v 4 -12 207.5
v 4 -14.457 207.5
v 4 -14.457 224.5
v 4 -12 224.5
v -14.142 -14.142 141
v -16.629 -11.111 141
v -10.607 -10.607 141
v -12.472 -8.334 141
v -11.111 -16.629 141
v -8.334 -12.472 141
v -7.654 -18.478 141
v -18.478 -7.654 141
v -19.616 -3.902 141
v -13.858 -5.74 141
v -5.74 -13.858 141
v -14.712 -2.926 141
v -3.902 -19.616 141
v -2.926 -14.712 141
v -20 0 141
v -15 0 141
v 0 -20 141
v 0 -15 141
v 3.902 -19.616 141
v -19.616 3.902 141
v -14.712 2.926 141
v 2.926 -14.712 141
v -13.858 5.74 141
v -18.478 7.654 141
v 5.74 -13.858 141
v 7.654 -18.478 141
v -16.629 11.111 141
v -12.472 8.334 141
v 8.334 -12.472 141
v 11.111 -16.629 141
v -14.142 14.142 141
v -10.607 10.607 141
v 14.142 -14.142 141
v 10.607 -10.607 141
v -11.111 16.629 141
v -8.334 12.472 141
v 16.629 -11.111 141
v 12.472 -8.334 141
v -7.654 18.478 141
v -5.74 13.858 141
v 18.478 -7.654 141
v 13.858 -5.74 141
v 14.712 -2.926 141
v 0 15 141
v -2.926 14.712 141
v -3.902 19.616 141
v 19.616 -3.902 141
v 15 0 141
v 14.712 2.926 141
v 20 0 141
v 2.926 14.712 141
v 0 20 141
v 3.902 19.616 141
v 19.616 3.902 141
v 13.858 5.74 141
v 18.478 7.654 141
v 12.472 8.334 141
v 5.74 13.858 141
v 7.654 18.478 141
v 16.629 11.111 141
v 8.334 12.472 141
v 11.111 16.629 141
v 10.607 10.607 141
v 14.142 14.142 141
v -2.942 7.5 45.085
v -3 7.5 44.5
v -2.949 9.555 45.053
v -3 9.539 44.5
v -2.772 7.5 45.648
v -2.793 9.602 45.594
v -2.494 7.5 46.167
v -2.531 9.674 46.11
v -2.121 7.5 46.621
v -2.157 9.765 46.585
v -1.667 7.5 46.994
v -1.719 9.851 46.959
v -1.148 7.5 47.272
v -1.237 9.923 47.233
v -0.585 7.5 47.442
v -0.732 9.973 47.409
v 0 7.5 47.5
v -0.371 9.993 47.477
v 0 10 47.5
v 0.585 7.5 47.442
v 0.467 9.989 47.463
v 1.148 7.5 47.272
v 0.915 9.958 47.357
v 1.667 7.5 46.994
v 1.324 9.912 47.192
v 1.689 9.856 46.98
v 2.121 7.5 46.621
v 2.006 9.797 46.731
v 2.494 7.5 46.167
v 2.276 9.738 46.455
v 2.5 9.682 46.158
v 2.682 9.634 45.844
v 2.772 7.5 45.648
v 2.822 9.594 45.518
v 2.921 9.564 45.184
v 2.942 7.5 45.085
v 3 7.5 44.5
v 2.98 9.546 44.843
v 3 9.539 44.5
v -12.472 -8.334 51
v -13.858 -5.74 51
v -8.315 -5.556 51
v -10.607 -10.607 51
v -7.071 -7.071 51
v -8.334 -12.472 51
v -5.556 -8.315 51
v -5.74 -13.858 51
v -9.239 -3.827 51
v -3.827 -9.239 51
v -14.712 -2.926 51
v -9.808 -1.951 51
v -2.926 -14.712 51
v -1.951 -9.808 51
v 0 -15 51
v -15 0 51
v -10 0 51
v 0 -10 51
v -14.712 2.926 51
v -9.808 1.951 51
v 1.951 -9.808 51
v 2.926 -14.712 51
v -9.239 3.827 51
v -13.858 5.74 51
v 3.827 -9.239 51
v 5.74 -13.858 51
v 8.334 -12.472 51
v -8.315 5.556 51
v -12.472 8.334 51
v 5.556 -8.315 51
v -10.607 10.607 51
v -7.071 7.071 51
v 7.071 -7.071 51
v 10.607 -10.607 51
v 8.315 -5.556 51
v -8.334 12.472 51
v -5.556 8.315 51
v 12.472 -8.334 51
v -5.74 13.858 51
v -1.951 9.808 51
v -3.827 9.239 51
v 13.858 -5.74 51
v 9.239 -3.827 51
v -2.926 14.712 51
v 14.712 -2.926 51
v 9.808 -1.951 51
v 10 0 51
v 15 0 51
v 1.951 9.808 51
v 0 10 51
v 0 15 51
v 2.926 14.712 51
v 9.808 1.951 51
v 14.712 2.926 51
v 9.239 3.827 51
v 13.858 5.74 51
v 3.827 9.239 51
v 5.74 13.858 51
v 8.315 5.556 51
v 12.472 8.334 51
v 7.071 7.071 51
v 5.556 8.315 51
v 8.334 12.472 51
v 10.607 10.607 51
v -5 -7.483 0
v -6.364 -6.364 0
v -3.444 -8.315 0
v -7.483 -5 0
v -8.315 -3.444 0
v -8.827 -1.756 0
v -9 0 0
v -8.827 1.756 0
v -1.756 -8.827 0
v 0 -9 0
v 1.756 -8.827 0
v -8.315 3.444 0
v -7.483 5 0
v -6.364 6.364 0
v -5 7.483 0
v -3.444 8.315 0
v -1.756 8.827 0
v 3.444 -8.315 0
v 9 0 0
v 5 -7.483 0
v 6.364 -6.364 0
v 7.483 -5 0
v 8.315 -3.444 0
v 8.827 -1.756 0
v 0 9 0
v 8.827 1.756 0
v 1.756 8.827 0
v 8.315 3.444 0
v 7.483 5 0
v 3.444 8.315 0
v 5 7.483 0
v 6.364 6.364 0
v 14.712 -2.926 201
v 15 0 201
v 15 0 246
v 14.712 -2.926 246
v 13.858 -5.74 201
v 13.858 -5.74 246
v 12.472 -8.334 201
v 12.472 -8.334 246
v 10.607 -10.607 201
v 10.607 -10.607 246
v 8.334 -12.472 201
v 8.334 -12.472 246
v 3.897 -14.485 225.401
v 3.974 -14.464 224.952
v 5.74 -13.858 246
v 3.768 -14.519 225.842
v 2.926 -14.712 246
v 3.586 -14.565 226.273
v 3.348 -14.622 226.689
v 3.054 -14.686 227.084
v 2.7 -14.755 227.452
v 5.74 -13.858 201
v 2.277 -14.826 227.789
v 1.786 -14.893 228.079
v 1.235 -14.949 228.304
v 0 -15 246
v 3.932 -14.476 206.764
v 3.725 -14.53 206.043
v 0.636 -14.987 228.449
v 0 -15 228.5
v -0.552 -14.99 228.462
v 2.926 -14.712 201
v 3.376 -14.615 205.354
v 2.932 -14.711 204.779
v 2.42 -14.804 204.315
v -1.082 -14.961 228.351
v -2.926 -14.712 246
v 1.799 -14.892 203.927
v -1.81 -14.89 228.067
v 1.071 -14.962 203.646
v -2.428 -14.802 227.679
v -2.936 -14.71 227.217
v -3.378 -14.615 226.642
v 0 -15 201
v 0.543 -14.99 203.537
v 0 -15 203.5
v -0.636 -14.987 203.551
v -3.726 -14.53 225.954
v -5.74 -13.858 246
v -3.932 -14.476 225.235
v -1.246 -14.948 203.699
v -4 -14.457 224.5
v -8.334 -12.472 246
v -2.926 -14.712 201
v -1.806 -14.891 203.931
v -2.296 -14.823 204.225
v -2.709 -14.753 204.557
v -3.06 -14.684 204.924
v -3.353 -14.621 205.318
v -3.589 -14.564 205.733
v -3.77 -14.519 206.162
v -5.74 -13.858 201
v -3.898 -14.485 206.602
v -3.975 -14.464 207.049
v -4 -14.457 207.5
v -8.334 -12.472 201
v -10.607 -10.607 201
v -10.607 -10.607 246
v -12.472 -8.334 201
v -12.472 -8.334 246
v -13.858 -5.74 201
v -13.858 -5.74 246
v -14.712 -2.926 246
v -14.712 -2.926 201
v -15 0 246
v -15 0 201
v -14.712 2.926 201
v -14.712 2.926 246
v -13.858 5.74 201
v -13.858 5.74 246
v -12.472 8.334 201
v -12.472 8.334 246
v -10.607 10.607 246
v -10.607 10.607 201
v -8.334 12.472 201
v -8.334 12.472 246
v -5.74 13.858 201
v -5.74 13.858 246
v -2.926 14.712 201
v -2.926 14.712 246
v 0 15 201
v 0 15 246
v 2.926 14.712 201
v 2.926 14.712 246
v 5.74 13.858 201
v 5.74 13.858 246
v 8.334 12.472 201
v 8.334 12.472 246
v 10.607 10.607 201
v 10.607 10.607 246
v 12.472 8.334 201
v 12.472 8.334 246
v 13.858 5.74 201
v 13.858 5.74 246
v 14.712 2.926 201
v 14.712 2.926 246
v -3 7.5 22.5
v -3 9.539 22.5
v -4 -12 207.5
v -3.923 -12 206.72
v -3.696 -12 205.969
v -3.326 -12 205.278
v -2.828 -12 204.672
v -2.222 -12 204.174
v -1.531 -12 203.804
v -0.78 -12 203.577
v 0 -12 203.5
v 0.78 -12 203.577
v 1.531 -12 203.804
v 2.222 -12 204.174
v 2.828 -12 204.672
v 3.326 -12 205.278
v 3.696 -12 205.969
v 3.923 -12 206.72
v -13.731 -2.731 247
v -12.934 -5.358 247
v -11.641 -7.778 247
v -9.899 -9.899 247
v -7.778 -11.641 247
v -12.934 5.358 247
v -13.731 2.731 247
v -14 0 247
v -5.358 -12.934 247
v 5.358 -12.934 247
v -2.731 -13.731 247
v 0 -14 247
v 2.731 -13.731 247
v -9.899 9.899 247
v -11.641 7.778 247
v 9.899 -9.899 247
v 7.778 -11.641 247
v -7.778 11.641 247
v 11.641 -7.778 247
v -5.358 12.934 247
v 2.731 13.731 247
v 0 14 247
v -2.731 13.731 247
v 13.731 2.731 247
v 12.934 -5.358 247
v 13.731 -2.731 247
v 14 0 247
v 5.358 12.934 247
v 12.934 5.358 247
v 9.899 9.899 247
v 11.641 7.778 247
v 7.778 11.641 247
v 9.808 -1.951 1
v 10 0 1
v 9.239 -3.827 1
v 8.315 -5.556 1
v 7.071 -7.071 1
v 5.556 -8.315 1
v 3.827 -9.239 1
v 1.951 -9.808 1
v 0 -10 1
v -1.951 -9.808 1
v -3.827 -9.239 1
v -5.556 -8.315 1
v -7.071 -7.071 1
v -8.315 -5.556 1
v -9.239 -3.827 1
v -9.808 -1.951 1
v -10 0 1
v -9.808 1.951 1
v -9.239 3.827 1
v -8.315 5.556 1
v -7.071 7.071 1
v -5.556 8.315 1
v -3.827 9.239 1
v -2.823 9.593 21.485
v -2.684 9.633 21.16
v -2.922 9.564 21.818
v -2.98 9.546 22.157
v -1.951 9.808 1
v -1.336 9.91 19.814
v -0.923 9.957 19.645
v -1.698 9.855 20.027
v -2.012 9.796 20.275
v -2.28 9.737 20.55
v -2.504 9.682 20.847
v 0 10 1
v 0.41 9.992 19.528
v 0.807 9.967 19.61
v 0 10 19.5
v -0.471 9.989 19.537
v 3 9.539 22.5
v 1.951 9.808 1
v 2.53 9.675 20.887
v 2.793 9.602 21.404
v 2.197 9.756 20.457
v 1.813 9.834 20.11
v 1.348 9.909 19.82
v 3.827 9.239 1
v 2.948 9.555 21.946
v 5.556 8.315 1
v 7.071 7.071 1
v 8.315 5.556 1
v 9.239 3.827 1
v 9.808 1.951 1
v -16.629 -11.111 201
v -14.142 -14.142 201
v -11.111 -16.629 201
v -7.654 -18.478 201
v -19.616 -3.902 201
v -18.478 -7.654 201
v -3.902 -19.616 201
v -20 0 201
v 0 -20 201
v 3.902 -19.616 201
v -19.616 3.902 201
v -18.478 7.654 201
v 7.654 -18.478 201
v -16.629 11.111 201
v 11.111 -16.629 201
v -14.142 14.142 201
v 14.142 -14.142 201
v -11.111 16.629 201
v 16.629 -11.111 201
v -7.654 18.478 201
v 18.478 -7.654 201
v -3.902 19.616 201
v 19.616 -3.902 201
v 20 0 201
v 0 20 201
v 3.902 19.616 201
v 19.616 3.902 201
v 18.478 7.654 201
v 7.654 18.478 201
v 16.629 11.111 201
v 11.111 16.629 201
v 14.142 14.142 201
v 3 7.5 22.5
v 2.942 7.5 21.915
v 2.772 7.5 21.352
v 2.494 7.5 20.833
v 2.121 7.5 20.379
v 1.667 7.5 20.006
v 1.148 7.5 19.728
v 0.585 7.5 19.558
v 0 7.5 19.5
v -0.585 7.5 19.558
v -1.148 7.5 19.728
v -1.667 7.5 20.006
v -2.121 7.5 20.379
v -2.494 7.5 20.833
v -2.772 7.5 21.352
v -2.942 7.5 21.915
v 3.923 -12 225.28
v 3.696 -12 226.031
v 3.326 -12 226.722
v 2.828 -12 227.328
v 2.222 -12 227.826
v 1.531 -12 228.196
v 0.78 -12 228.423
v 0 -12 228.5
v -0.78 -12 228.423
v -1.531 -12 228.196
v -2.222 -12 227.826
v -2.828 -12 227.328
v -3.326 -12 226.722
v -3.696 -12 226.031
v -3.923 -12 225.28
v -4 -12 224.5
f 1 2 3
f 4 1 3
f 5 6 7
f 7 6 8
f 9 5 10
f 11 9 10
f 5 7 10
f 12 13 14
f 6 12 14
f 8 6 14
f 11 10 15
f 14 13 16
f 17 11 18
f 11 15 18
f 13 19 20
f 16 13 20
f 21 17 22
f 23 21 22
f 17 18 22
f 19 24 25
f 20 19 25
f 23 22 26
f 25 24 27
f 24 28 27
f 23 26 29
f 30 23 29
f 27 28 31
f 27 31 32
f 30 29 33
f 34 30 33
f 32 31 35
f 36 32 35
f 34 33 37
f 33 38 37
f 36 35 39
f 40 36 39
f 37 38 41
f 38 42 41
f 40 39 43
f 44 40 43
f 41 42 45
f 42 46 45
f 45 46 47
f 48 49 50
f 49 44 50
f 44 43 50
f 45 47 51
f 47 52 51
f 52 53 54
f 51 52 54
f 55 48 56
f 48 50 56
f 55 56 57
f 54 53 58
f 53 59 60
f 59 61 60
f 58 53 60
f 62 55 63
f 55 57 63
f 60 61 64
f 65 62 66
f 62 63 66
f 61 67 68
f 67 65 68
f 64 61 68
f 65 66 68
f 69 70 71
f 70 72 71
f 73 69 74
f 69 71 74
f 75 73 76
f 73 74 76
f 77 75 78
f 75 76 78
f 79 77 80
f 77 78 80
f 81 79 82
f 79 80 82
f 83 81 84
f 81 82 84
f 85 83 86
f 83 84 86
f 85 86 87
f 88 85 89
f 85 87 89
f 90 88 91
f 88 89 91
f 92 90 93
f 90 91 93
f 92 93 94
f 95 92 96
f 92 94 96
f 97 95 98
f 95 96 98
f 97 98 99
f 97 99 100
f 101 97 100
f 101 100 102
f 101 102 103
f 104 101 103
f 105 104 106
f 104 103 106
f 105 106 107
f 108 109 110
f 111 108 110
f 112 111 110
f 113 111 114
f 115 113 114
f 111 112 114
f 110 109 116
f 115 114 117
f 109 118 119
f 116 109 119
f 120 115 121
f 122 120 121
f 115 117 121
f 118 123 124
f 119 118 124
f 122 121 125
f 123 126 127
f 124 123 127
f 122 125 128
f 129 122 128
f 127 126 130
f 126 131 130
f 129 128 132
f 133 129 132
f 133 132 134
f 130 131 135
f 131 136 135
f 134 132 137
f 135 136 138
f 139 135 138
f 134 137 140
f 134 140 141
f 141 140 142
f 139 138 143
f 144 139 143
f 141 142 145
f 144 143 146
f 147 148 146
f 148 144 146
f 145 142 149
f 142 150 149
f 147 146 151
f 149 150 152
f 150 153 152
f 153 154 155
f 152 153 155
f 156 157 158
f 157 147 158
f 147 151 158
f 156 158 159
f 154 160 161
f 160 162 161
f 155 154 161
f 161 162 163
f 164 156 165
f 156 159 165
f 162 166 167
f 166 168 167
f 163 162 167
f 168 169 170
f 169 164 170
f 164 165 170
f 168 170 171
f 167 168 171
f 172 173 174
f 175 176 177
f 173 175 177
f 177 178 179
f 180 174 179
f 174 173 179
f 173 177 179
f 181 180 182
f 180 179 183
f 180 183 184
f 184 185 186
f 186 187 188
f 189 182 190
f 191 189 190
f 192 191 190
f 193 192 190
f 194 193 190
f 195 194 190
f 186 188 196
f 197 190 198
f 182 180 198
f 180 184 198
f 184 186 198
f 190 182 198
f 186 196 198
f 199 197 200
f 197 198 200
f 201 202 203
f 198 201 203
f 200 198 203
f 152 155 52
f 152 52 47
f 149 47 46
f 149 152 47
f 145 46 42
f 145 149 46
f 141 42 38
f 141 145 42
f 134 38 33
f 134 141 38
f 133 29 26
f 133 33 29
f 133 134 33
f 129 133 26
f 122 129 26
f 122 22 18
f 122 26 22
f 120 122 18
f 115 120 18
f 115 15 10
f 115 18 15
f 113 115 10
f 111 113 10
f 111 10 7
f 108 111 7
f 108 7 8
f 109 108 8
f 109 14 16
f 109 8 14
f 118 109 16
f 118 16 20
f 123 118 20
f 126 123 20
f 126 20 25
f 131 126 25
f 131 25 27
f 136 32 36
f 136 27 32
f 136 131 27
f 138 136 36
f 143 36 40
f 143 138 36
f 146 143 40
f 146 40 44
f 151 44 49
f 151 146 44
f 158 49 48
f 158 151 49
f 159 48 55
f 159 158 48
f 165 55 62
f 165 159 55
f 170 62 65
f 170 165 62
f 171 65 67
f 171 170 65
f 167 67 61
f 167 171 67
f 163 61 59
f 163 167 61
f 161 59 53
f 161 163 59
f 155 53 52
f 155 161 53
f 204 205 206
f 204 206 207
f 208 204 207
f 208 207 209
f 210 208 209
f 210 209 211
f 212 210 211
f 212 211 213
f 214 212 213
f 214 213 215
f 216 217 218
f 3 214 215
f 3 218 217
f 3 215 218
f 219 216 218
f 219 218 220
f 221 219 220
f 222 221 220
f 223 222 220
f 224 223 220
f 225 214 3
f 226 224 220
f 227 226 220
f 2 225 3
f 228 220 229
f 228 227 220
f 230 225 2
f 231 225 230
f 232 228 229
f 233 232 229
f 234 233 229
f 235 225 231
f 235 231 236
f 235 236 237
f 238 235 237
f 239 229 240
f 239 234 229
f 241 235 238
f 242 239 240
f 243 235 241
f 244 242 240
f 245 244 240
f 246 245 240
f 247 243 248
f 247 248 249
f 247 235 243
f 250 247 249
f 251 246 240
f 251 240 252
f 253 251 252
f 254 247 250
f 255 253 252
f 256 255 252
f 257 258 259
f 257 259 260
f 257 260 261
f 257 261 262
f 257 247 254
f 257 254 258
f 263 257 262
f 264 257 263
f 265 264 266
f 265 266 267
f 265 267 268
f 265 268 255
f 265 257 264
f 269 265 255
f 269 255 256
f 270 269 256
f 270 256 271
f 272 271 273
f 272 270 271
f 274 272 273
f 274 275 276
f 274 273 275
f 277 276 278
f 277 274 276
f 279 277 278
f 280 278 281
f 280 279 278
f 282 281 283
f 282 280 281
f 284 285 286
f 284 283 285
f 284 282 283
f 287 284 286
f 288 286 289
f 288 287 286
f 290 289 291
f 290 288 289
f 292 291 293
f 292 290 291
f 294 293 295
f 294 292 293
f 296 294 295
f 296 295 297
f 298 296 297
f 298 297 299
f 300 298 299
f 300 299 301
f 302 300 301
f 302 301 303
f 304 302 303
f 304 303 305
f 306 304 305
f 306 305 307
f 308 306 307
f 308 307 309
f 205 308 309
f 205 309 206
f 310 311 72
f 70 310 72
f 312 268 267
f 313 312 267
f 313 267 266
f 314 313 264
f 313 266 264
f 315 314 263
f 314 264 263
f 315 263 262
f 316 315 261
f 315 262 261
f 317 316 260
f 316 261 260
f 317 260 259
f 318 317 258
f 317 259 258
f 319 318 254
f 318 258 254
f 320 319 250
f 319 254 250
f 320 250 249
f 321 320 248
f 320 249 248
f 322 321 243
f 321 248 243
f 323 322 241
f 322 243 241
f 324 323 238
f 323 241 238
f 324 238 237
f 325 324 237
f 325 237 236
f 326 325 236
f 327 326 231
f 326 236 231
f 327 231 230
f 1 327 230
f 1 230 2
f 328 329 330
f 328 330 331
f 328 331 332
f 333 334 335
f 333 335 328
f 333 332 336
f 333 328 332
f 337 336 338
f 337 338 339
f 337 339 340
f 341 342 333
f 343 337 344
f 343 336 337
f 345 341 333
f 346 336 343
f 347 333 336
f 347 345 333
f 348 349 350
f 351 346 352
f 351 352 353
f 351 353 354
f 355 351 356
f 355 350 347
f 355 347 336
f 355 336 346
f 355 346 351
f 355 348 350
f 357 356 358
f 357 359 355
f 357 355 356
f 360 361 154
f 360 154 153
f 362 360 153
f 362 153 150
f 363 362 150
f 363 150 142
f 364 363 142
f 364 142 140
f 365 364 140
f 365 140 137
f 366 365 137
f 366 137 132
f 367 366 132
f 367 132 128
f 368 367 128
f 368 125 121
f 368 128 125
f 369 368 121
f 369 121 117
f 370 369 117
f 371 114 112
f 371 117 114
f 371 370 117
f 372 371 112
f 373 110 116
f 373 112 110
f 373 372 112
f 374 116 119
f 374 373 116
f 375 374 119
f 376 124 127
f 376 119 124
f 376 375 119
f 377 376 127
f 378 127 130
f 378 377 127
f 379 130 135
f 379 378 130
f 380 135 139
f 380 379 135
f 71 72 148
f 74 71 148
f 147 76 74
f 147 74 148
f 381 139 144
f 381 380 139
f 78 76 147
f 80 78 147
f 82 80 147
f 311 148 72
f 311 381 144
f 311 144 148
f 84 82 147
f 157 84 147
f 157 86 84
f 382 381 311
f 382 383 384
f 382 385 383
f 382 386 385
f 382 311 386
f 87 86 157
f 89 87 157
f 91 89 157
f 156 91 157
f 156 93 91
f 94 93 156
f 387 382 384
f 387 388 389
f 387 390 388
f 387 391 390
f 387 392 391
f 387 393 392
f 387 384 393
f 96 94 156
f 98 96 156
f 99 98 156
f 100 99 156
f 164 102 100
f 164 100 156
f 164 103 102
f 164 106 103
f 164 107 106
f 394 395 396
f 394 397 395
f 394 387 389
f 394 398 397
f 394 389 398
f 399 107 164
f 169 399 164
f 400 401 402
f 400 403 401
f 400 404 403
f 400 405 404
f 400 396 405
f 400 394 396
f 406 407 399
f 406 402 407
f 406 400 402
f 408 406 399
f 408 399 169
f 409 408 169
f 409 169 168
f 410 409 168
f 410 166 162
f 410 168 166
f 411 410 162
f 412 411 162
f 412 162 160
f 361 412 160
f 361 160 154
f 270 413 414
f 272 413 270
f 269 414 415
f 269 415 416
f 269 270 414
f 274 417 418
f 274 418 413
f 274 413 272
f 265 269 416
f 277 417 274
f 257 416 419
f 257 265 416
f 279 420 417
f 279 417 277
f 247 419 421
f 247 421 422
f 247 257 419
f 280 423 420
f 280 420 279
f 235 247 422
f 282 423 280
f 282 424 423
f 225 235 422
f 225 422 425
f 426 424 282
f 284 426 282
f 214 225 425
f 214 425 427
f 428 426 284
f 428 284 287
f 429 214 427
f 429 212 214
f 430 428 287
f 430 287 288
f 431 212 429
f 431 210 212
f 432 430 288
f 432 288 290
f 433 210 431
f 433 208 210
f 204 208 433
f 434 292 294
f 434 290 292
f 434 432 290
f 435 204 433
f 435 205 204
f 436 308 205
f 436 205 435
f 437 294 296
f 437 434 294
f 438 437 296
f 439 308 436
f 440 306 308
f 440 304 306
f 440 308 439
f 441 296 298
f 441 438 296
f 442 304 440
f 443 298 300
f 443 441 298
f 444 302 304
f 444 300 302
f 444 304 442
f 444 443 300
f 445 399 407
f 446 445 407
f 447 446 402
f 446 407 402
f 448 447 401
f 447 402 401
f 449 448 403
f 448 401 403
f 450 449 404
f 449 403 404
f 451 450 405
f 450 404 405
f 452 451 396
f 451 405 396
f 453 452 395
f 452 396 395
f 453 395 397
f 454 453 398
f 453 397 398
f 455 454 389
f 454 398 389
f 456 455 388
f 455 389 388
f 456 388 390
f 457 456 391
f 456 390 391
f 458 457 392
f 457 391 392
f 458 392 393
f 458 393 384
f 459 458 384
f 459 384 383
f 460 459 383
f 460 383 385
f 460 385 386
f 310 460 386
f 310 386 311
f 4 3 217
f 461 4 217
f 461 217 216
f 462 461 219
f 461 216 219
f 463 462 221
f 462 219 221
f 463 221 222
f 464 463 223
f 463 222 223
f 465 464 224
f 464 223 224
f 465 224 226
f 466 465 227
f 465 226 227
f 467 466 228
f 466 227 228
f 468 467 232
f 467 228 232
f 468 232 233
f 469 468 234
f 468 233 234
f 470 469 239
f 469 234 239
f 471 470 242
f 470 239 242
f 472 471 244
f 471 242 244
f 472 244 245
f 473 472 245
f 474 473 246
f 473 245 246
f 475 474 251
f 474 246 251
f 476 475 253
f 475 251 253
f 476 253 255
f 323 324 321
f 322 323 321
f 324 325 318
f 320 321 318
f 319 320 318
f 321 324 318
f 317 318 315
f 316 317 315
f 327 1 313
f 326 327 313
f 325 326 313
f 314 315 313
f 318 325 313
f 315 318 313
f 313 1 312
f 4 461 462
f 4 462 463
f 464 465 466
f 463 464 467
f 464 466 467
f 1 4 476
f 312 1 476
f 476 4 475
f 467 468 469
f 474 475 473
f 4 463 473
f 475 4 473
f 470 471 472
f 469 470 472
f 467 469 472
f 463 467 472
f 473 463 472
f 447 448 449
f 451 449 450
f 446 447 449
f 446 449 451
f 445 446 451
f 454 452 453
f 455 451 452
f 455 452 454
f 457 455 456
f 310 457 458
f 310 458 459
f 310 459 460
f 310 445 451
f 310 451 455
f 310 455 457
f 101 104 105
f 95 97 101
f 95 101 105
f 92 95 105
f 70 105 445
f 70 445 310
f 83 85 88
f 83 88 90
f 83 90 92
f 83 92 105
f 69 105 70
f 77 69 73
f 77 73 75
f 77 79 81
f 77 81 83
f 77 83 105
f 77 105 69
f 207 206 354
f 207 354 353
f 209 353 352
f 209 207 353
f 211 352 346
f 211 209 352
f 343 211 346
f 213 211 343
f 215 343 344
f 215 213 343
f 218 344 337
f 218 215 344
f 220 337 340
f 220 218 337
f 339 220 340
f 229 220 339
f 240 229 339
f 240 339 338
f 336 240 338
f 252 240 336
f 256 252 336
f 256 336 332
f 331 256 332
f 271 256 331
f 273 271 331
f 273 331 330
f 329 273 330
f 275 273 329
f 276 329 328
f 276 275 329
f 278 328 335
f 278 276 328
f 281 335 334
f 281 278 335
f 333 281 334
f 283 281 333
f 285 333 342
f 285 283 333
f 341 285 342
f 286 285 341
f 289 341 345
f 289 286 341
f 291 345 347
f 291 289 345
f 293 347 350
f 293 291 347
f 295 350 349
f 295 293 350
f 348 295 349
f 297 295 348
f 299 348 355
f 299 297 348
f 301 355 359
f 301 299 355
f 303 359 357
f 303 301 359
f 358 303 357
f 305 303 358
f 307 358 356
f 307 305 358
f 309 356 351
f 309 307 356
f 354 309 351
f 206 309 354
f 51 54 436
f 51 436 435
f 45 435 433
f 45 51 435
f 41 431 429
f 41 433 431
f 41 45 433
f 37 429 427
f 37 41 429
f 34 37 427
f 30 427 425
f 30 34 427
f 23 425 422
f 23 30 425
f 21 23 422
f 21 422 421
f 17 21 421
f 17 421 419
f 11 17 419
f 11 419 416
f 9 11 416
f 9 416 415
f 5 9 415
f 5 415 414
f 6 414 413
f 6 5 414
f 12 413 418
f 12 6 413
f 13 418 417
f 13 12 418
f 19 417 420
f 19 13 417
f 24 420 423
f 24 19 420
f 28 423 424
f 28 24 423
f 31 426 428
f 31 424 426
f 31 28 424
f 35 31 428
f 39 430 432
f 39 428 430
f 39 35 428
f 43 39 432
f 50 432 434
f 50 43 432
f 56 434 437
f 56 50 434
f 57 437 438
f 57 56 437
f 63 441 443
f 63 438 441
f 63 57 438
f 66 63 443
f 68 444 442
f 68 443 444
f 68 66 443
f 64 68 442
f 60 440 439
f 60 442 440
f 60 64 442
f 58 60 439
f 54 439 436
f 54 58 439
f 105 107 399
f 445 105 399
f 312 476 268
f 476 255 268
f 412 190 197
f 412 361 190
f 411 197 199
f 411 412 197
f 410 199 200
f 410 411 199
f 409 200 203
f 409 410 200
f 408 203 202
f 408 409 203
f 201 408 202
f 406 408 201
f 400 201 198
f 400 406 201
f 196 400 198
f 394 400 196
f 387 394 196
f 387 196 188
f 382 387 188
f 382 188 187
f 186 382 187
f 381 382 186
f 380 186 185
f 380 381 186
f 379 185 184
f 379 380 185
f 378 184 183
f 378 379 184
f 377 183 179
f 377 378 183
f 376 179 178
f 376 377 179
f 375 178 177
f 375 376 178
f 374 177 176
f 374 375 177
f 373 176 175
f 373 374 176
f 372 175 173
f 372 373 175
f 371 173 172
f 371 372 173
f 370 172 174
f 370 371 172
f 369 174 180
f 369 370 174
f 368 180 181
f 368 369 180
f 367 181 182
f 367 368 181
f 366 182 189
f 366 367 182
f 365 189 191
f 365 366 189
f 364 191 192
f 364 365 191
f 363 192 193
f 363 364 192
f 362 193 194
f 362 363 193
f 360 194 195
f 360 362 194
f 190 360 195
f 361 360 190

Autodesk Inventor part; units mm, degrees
ref_plane "YZ Plane" through (0, 0, 0) normal (1, 0, 0) x (0, 1, 0)
sketch "草图1" plane through (0, 0, 0) normal (0, 0, 1) x (1, 0, 0)
  circle A0 centre (0, 0) radius 10
  dimension "d0" = 20
extrude "拉伸1" add sketch "草图1" along normal blind 51
sketch "草图2" plane through (0, 0, 51) normal (0, 0, 1) x (1, 0, 0)
  circle A0 centre (0, 0) radius 15
  dimension "d3" = 30
extrude "拉伸2" add sketch "草图2" along normal blind 90
sketch "草图3" plane through (0, 0, 141) normal (0, 0, 1) x (1, 0, 0)
  circle A0 centre (0, 0) radius 20
  dimension "d6" = 40
extrude "拉伸3" add sketch "草图3" along normal blind 60
sketch "草图4" plane through (0, 0, 201) normal (0, 0, 1) x (1, 0, 0)
  circle A0 centre (0, 0) radius 15
  dimension "d9" = 30
extrude "拉伸4" add sketch "草图4" along normal blind 46
chamfer "倒角1" distance 1 angle 45 2 edges at (-15, 0, 247) (-10, 0, 0)
ref_plane "工作平面1" through (0, 10, 0) normal (0, 1, 0) x (-1, 0, 0)
sketch "草图5" plane through (0, 10, 0) normal (0, 1, 0) x (-1, 0, 0)
  line L0 (3, 44.5) -> (-3, 44.5)
  line L1 (-3, 44.5) -> (-3, 22.5)
  line L2 (-3, 22.5) -> (3, 22.5)
  line L3 (3, 22.5) -> (3, 44.5)
  arc A0 (-3, 22.5) -> (3, 22.5) centre (0, 22.5) ccw
  arc A1 (3, 44.5) -> (-3, 44.5) centre (0, 44.5) ccw
  line L4 (0, 0) -> (0, -6.1876)
  line L5 (-15, 51) -> (15, 51) projected
  dimension "d15" = 6
  dimension "d16" = 6.1876
  dimension "d17" = 6.5
  dimension "d18" = 22
extrude "拉伸5" cut sketch "草图5" against normal blind 2.5
ref_plane "工作平面2" through (0, -15, 201) normal (0, 1, 0) x (-1, 0, 0)
sketch "草图6" plane through (0, -15, 201) normal (0, 1, 0) x (-1, 0, 0)
  line L0 (-4, 23.5) -> (4, 23.5)
  line L1 (4, 23.5) -> (4, 6.5)
  line L2 (4, 6.5) -> (-4, 6.5)
  line L3 (-4, 6.5) -> (-4, 23.5)
  arc A0 (-4, 6.5) -> (4, 6.5) centre (0, 6.5) ccw
  arc A1 (4, 23.5) -> (-4, 23.5) centre (0, 23.5) ccw
  line L4 (20, 0) -> (-20, 0) projected
  line L5 (0, 0) -> (0, 6.5)
  point P0 (0, -201)
  dimension "d21" = 6.5
  dimension "d22" = 8
  dimension "d23" = 17
extrude "拉伸6" cut sketch "草图6" along normal blind 3
properties part number "齿轮160配件"
